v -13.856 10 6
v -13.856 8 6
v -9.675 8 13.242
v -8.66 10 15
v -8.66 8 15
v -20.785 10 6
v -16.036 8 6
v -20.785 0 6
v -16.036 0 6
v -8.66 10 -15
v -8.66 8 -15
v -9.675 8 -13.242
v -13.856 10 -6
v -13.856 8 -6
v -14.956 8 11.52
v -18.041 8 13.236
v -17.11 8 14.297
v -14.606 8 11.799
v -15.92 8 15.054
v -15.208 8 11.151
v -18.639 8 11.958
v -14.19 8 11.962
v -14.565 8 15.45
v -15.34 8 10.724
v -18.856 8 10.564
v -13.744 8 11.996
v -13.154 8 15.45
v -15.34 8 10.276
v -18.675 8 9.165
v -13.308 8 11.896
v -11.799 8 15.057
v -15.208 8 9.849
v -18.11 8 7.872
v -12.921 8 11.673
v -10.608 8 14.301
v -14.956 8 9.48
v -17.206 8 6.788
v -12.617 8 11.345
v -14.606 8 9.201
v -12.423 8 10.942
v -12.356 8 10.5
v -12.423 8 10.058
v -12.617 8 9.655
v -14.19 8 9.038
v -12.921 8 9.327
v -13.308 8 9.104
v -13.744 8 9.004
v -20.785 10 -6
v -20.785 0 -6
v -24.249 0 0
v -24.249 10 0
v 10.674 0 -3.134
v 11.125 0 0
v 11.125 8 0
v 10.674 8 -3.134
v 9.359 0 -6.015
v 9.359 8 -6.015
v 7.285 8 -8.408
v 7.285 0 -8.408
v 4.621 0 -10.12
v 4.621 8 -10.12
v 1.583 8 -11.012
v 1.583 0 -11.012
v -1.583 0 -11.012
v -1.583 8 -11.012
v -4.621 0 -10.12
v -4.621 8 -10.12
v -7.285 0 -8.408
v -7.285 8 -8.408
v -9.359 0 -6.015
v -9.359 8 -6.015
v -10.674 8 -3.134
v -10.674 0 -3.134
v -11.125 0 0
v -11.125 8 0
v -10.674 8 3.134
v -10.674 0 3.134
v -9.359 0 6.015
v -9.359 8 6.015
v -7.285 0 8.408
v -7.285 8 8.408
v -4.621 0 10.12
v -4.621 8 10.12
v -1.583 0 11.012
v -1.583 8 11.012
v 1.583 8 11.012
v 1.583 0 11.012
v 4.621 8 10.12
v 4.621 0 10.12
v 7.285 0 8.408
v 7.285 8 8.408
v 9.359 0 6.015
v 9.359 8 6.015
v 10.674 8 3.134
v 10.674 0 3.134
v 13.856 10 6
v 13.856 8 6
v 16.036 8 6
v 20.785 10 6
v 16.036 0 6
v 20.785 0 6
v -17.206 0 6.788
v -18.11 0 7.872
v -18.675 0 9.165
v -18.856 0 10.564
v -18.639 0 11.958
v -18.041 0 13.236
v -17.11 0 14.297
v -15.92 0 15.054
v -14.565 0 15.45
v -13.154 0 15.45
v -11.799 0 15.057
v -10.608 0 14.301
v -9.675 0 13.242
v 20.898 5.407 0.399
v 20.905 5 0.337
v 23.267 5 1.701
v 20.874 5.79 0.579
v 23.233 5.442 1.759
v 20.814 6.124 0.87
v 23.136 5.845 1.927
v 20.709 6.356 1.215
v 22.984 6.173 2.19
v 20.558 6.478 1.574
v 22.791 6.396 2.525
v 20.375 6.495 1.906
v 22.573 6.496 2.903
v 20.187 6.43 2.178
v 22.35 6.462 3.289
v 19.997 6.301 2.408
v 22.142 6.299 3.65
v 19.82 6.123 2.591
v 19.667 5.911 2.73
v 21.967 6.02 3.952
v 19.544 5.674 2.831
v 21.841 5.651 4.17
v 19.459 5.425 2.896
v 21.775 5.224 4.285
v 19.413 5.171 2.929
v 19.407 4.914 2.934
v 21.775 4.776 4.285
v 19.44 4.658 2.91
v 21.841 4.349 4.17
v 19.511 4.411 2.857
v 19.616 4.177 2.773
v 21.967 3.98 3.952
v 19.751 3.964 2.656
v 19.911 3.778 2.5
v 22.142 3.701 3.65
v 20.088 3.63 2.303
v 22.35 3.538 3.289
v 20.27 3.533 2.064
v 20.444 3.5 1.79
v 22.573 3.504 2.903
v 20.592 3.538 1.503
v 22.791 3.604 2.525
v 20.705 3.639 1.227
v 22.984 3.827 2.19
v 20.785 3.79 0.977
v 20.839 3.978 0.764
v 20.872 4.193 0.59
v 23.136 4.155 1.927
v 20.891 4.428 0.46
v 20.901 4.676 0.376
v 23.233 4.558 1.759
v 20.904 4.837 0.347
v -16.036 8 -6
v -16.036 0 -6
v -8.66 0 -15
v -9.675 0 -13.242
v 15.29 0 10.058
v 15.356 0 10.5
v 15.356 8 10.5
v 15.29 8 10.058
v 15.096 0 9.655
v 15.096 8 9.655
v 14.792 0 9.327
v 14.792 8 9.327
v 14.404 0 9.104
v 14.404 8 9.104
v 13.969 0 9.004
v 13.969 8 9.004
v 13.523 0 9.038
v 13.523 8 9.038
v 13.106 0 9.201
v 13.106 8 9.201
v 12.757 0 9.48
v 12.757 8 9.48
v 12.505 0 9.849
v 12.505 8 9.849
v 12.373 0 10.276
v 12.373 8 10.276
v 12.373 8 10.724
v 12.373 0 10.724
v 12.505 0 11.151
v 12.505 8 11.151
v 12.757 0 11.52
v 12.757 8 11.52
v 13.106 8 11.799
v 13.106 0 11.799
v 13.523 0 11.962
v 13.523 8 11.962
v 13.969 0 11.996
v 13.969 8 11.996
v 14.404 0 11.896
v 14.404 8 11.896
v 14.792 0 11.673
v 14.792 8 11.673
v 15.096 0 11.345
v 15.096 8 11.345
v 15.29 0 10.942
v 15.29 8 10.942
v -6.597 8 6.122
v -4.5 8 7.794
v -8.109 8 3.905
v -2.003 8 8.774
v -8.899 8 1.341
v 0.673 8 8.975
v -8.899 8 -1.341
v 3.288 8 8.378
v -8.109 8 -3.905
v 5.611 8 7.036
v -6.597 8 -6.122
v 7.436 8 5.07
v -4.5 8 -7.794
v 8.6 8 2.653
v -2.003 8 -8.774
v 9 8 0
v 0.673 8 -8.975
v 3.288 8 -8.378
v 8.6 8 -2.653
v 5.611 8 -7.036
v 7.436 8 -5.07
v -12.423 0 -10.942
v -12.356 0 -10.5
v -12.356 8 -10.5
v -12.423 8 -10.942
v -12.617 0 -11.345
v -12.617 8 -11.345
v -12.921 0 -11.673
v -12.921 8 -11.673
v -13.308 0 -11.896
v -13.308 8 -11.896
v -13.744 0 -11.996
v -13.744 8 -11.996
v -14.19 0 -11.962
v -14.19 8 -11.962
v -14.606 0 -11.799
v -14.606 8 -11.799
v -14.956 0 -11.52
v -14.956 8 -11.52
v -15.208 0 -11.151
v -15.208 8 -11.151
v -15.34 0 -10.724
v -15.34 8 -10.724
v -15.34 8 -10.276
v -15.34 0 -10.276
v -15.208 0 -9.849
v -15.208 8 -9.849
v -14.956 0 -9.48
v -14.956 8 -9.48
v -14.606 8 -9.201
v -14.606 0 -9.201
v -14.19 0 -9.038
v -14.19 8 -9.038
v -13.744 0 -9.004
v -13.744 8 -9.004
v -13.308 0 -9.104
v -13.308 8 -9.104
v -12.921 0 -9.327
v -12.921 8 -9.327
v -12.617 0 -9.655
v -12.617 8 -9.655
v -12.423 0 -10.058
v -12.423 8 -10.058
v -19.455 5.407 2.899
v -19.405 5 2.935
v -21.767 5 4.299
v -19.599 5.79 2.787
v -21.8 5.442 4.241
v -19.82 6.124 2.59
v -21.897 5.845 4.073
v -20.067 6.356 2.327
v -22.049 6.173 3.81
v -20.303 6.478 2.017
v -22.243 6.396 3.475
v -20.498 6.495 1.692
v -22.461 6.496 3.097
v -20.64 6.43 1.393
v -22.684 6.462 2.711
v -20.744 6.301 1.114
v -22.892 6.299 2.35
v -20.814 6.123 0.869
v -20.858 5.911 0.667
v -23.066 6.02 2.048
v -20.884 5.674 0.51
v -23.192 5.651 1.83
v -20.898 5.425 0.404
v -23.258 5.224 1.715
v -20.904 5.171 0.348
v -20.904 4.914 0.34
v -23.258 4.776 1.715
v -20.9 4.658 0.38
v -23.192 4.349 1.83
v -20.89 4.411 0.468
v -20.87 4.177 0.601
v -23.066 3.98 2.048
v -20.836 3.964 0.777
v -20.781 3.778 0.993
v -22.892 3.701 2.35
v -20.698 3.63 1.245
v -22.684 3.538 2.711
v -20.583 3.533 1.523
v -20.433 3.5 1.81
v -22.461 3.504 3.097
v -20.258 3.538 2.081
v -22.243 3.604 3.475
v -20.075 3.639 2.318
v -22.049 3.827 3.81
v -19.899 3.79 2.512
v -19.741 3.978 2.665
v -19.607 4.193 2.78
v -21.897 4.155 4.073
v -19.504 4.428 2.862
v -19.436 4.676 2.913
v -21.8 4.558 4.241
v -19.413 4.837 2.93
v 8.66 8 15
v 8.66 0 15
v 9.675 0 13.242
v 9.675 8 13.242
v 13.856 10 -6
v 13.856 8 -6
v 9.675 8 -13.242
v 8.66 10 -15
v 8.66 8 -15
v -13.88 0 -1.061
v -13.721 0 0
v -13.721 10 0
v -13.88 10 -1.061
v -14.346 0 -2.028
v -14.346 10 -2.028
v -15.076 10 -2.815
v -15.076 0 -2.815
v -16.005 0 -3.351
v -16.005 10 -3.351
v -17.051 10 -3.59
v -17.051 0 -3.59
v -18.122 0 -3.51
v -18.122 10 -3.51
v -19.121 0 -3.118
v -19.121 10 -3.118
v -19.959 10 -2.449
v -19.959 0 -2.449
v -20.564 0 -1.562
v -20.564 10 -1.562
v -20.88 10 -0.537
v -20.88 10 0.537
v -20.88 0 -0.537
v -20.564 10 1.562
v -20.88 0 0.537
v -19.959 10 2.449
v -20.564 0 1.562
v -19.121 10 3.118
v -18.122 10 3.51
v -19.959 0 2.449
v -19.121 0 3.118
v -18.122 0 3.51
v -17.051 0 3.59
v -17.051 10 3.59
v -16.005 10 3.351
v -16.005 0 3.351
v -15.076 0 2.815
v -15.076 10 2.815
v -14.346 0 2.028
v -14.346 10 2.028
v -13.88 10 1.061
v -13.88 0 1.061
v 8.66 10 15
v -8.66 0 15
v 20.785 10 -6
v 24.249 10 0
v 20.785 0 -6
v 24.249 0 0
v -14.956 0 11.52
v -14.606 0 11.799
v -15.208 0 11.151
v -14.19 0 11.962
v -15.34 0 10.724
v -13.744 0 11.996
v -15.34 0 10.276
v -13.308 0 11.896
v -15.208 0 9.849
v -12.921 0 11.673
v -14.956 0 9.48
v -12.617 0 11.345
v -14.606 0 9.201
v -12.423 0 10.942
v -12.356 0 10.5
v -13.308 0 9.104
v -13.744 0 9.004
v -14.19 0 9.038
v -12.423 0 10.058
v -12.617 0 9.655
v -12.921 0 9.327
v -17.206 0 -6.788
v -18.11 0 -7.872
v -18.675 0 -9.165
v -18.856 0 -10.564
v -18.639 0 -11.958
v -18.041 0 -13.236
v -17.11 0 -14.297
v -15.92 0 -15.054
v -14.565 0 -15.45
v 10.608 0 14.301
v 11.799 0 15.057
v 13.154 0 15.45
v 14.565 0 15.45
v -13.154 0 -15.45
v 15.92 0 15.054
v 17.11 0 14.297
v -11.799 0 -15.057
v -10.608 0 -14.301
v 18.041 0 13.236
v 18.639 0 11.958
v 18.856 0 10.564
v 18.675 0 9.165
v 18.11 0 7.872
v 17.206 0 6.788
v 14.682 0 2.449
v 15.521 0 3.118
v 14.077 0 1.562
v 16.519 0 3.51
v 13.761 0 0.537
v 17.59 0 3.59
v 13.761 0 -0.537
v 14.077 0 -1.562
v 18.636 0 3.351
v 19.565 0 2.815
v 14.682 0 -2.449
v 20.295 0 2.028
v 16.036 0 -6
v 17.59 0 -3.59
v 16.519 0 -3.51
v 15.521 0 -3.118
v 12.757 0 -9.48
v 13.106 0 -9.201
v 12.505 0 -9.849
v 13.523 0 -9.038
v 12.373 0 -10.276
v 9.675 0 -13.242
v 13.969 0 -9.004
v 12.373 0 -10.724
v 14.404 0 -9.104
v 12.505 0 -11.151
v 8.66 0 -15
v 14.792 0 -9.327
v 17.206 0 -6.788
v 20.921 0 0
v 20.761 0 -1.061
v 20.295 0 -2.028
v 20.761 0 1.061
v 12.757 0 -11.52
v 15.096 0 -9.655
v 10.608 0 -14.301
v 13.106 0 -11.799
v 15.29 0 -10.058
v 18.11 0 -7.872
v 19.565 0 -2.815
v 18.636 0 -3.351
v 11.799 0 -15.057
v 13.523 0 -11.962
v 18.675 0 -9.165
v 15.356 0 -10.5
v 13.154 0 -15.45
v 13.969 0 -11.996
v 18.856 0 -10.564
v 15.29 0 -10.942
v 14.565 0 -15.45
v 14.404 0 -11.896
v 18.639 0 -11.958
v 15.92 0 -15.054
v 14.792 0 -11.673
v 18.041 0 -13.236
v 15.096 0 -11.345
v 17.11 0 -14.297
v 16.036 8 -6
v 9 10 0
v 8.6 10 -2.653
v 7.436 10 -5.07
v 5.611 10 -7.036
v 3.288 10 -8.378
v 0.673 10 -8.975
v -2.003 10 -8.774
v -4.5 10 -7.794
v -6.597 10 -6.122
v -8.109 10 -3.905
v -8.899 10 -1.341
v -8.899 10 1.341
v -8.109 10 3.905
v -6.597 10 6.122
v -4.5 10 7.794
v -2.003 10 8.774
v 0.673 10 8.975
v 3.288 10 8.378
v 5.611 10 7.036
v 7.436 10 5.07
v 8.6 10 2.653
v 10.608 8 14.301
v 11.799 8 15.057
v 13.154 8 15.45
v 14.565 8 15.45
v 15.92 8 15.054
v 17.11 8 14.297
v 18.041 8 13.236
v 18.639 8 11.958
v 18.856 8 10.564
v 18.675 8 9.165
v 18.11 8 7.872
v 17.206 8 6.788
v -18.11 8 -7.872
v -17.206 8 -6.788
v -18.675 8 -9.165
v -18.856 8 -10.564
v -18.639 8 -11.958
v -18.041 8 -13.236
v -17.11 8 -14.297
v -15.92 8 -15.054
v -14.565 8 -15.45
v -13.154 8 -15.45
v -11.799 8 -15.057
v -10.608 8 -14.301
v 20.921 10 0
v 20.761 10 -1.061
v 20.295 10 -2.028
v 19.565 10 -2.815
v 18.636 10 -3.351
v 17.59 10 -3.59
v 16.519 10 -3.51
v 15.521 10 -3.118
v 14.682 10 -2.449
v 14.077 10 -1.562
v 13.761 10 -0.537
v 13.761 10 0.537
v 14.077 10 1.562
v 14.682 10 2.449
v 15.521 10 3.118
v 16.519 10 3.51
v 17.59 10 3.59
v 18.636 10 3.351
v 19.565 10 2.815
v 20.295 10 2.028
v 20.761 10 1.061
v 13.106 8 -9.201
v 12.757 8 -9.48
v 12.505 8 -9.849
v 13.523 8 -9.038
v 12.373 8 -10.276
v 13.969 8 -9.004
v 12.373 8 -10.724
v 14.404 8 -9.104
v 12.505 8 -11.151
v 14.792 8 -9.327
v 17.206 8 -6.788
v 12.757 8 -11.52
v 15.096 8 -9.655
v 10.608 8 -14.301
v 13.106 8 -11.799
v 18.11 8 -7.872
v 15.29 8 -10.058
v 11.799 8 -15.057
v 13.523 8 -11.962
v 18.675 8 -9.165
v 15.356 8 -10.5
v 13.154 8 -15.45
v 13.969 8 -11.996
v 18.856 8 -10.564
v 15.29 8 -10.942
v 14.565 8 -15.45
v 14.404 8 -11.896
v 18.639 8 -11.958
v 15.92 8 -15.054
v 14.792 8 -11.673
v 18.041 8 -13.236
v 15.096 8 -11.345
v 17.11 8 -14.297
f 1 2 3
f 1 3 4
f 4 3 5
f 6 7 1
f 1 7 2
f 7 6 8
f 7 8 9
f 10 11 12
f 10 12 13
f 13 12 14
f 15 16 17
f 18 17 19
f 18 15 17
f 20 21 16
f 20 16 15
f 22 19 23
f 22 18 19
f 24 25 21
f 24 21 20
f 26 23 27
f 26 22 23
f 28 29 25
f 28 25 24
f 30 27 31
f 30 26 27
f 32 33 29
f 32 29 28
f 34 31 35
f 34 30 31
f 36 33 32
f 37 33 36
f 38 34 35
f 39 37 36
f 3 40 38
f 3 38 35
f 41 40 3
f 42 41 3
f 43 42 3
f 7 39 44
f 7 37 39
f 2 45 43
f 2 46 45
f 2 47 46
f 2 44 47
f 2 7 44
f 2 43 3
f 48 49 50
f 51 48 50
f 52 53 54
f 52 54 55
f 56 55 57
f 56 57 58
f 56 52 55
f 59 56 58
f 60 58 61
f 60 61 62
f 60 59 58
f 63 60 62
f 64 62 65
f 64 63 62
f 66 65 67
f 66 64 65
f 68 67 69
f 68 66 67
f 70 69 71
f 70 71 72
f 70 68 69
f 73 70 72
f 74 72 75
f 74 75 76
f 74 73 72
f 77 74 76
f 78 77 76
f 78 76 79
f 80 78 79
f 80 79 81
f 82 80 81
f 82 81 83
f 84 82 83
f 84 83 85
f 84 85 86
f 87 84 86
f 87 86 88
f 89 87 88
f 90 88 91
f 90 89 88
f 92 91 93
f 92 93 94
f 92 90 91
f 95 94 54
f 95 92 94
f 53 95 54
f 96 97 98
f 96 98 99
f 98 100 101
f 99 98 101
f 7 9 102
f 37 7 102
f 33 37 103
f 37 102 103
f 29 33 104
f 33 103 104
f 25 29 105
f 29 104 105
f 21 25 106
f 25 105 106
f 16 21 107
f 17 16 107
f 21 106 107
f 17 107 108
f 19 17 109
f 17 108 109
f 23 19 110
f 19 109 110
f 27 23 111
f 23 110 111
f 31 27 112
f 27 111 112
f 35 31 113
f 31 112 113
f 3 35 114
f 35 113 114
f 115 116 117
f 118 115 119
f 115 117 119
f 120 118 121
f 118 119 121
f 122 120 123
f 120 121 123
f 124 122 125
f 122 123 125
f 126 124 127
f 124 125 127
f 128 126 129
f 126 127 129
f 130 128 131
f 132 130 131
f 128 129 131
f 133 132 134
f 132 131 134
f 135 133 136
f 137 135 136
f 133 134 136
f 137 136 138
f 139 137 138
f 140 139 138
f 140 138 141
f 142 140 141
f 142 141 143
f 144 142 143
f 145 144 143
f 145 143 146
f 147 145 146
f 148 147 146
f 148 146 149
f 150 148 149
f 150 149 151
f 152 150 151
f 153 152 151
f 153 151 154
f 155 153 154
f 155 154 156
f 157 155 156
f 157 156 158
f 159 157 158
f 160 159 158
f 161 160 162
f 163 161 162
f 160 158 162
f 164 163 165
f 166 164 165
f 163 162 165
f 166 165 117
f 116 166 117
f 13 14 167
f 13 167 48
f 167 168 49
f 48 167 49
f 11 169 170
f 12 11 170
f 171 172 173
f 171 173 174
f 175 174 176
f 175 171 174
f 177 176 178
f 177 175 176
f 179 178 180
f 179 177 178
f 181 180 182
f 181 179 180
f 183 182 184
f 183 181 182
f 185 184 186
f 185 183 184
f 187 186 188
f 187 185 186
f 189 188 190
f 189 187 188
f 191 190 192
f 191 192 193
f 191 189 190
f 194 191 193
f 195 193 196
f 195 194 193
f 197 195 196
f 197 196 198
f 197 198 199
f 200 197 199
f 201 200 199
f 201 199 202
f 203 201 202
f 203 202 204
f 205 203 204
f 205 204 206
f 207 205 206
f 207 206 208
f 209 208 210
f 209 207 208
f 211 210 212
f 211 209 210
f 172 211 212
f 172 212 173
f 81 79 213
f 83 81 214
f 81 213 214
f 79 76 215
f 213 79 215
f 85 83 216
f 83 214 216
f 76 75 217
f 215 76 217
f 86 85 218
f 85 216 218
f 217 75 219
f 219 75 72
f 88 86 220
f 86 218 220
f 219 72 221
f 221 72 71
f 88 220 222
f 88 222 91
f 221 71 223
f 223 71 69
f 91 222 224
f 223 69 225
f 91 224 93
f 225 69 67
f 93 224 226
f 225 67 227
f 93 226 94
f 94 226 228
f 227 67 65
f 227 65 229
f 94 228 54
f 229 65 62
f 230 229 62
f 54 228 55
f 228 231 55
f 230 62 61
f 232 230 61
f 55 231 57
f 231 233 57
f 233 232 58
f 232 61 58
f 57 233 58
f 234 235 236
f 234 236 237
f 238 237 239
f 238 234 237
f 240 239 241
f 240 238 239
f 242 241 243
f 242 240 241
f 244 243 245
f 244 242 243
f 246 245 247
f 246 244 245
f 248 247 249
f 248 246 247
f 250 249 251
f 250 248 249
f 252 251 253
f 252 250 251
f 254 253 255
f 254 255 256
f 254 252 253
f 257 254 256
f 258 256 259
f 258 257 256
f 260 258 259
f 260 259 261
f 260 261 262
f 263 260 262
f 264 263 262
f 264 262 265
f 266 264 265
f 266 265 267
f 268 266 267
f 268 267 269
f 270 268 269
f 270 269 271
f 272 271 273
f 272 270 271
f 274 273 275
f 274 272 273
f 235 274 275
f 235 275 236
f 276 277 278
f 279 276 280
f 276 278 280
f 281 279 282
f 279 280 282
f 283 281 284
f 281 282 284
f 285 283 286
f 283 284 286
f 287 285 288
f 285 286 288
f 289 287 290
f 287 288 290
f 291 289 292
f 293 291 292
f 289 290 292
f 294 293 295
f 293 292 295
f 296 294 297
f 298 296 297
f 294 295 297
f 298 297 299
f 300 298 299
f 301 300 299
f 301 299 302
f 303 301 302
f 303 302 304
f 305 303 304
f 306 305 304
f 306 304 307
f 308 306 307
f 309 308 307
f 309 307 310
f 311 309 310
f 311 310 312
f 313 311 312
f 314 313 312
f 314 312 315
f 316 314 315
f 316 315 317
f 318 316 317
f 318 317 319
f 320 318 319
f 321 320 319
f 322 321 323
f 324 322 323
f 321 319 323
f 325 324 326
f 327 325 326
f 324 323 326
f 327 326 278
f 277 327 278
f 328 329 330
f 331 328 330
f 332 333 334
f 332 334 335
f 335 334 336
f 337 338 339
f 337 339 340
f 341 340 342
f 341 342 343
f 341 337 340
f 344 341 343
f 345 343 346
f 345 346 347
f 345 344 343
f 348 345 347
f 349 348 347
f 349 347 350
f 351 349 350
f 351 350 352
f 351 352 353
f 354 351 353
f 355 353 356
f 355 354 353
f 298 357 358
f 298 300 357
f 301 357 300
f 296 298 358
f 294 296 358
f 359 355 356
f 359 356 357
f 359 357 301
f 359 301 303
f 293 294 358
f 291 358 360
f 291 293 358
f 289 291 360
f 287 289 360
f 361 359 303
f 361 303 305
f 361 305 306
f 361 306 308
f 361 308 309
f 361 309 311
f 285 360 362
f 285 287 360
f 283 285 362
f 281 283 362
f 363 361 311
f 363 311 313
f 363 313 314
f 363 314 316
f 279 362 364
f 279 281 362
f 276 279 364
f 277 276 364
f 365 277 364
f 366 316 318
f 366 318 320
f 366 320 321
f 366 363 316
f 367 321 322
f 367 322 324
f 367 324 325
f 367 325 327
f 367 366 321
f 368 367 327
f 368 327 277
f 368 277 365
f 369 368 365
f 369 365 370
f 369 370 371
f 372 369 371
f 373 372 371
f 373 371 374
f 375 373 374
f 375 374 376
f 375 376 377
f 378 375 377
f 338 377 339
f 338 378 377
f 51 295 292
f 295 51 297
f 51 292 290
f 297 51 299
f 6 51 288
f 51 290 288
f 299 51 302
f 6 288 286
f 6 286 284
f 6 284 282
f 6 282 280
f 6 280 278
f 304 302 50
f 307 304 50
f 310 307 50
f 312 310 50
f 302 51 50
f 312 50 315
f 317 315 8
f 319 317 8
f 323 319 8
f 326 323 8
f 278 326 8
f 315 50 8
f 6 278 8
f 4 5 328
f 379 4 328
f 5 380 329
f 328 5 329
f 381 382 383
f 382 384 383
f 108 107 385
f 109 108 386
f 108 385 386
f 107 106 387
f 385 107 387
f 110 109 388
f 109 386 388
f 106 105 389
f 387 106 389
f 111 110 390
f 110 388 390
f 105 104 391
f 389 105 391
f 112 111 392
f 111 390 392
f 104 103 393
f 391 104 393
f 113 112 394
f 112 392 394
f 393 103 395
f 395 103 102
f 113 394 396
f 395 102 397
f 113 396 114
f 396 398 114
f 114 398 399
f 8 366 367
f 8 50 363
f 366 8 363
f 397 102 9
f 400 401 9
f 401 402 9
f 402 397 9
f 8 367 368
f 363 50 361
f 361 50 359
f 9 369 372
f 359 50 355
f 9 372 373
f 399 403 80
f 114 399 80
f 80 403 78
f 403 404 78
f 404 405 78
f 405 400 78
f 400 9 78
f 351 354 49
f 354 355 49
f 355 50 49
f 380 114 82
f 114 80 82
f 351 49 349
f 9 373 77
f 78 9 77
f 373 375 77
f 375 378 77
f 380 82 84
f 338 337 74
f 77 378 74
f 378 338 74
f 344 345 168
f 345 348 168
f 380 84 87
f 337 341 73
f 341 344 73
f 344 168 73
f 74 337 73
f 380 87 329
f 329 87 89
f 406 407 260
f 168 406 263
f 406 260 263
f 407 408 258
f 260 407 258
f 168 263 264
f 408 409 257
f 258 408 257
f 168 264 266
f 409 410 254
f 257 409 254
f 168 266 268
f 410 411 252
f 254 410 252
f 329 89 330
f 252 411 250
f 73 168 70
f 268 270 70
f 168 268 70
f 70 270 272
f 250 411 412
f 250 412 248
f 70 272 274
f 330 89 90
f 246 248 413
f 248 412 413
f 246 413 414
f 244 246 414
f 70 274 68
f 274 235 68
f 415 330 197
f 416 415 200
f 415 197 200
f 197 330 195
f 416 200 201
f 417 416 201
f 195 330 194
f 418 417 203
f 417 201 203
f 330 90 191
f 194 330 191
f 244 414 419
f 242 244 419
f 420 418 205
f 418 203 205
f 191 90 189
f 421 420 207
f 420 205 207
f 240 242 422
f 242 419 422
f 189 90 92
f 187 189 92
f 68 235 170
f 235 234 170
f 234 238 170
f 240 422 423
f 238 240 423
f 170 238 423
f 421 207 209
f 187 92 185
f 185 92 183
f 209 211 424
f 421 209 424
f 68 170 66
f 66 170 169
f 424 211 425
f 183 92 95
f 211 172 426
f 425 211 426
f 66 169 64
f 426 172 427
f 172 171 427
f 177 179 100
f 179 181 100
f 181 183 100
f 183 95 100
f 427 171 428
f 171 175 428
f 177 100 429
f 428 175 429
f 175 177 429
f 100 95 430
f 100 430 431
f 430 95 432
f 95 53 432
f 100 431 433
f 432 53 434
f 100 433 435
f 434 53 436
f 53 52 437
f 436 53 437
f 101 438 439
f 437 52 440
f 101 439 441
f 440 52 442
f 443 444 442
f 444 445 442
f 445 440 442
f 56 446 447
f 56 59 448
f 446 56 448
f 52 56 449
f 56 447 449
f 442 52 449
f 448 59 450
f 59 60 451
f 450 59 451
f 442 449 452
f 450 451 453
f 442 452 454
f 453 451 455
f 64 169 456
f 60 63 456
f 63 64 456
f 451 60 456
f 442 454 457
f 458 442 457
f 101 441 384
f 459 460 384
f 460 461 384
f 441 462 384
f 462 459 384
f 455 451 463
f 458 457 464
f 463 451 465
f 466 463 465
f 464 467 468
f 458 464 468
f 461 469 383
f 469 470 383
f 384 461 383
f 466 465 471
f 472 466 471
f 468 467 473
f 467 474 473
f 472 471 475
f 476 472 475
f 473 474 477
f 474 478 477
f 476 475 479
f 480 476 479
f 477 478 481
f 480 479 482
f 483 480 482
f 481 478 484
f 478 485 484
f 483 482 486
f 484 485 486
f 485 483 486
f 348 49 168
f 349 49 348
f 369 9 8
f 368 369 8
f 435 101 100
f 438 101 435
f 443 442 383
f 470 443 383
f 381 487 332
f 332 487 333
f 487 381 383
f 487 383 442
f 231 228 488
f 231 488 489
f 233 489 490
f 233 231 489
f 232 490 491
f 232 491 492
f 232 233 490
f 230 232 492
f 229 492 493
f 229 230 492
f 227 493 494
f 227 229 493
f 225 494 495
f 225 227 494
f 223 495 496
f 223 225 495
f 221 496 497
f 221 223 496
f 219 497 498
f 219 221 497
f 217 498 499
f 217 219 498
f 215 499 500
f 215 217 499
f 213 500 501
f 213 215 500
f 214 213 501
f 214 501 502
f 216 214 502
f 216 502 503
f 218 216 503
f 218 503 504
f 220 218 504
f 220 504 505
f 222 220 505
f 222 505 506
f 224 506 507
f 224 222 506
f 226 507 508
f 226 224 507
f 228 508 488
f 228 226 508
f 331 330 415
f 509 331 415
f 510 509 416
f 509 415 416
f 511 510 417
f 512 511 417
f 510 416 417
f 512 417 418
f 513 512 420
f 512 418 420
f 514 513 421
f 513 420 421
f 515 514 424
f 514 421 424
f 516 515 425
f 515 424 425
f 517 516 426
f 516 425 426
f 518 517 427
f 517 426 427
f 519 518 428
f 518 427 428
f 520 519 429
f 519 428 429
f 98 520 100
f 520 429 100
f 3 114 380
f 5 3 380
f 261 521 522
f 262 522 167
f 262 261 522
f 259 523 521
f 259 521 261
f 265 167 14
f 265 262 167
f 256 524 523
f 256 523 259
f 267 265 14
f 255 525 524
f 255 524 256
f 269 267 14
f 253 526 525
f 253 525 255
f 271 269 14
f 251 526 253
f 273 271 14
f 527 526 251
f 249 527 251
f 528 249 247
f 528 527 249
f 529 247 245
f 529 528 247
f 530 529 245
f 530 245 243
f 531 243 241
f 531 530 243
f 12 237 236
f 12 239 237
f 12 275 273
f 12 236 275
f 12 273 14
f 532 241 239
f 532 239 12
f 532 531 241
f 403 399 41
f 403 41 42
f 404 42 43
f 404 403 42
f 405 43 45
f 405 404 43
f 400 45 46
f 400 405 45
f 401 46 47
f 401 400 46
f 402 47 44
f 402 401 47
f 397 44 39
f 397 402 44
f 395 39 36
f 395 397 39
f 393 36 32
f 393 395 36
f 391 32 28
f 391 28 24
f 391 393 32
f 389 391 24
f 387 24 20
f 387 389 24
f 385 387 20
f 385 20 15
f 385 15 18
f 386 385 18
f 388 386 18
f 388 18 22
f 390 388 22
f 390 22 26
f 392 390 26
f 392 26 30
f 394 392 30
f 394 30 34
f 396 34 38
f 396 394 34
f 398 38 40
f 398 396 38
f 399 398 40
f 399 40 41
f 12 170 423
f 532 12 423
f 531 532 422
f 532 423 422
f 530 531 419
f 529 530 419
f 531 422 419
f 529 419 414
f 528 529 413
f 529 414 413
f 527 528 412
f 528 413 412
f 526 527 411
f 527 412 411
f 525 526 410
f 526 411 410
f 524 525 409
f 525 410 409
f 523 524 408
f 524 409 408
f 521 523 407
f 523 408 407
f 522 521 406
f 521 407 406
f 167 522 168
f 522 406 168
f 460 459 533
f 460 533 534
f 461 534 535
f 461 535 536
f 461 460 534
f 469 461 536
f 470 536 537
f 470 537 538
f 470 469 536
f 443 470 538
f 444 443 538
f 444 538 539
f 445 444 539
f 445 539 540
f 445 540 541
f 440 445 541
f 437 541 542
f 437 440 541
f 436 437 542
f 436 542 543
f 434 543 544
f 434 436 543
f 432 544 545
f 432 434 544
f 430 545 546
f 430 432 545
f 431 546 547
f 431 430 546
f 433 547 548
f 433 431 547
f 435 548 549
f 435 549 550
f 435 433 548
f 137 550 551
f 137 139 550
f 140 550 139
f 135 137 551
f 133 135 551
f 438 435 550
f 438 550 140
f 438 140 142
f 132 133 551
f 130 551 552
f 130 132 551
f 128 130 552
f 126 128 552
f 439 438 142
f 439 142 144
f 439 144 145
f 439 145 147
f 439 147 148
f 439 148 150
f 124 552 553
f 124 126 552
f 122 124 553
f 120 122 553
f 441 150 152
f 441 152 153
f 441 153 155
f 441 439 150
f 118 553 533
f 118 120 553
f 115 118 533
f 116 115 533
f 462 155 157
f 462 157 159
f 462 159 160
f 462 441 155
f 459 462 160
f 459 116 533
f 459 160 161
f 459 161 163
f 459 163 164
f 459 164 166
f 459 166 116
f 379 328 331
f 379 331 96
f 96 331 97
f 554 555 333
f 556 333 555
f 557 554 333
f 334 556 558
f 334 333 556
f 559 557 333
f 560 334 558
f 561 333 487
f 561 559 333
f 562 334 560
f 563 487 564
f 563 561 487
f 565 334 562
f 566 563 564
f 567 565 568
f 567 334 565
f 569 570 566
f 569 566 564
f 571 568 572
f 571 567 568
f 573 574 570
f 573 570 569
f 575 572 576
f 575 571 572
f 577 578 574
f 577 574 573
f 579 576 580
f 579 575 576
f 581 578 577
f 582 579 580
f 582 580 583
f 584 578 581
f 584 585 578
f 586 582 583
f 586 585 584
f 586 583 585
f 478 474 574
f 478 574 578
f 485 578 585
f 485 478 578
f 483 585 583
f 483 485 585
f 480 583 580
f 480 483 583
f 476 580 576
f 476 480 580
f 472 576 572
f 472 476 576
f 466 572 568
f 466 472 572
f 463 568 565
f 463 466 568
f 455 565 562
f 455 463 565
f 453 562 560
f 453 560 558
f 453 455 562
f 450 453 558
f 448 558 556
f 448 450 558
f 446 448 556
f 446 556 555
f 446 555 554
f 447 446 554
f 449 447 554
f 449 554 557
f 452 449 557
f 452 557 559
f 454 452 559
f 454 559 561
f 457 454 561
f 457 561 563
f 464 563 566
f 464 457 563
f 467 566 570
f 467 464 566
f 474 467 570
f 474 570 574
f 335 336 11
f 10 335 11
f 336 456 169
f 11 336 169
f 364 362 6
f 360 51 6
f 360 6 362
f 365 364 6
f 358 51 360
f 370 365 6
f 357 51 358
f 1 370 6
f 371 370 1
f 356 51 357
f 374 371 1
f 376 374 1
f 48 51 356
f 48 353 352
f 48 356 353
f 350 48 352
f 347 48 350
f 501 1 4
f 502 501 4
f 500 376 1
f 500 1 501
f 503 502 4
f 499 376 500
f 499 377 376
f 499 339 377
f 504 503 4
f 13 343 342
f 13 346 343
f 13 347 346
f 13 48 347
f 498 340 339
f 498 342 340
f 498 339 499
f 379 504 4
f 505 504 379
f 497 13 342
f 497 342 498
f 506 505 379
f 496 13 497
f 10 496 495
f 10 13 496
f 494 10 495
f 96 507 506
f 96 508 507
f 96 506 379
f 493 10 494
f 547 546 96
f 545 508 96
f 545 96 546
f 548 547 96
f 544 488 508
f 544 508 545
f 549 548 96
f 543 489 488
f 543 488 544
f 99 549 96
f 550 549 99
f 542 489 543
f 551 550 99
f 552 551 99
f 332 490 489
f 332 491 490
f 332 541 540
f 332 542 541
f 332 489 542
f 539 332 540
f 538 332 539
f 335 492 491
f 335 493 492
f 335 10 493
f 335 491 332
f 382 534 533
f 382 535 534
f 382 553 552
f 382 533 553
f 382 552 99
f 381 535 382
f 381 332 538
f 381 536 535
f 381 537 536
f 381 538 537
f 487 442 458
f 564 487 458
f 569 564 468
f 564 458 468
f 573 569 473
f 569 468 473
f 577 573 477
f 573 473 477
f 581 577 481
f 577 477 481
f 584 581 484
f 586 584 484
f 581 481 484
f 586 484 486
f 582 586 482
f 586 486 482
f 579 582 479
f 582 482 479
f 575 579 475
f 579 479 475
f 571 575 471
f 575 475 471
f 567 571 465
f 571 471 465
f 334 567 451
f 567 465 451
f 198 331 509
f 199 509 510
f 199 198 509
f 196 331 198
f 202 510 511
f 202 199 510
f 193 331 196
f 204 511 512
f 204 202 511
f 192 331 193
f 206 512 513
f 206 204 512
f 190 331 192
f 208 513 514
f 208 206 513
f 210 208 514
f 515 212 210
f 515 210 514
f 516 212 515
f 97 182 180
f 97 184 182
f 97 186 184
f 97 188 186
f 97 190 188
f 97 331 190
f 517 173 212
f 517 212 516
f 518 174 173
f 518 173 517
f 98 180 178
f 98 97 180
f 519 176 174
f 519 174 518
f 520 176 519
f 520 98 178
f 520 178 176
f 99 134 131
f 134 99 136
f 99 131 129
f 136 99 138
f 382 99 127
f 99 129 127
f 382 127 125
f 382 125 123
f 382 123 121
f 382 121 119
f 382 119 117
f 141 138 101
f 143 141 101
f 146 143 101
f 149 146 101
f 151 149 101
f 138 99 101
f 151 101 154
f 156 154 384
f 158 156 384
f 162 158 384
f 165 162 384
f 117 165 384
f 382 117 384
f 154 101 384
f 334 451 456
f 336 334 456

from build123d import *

# Parameters (mm, degrees)
SKETCH1_R                      = 11.125
SKETCH1_R_2                    = 3.6
SKETCH1_R_3                    = 1.5
BOSS_EXTRUDE1_DEPTH            = 8
SKETCH2_R                      = 9
SKETCH2_R_2                    = 3.6
BOSS_EXTRUDE2_DEPTH            = 2
CUT_EXTRUDE1_REACH             = 51.75
SKETCH4_R                      = 1.5
CUT_EXTRUDE1_DIRECTION_2_DEPTH = 8.75
CUT_EXTRUDE2_REACH             = 51.75
SKETCH5_R                      = 1.5


with BuildPart() as part:
    # Sketch1 → Boss-Extrude1 (new body)
    with BuildSketch(Plane(origin=(0, 0, 0), x_dir=(1, 0, 0), z_dir=(0, 1, 0))):
        with BuildLine():
            Line((8.660254038, 15), (-8.660254038, 15))
            Line((-8.660254038, 15), (-9.675277915, 13.241927075))
            ThreePointArc((-9.675277915, 13.241927075), (-17.613141308, 13.799536829), (-16.035855932, 6))
            Line((-16.035855932, 6), (-20.784609691, 6))
            Line((-20.784609691, 6), (-24.248711306, 0))
            Line((-24.248711306, 0), (-20.784609691, -6))
            Line((-20.784609691, -6), (-16.035855932, -6))
            ThreePointArc((-16.035855932, -6), (-17.613141308, -13.799536829), (-9.675277915, -13.241927075))
            Line((-9.675277915, -13.241927075), (-8.660254038, -15))
            Line((-8.660254038, -15), (8.660254038, -15))
            Line((8.660254038, -15), (9.675277915, -13.241927075))
            ThreePointArc((9.675277915, -13.241927075), (17.613141308, -13.799536829), (16.035855932, -6))
            Line((16.035855932, -6), (20.784609691, -6))
            Line((20.784609691, -6), (24.248711306, 0))
            Line((24.248711306, 0), (20.784609691, 6))
            Line((20.784609691, 6), (16.035855932, 6))
            ThreePointArc((16.035855932, 6), (17.613141308, 13.799536829), (9.675277915, 13.241927075))
            Line((9.675277915, 13.241927075), (8.660254038, 15))
        make_face()
        Circle(SKETCH1_R, mode=Mode.SUBTRACT)
        with Locations((17.320508076, 0)):
            Circle(SKETCH1_R_2, mode=Mode.SUBTRACT)
        with Locations((-17.320508076, 0)):
            Circle(SKETCH1_R_2, mode=Mode.SUBTRACT)
        with Locations((-13.856406461, 10.5)):
            Circle(SKETCH1_R_3, mode=Mode.SUBTRACT)
        with Locations((13.856406461, 10.5)):
            Circle(SKETCH1_R_3, mode=Mode.SUBTRACT)
        with Locations((13.856406461, -10.5)):
            Circle(SKETCH1_R_3, mode=Mode.SUBTRACT)
        with Locations((-13.856406461, -10.5)):
            Circle(SKETCH1_R_3, mode=Mode.SUBTRACT)
    extrude(amount=BOSS_EXTRUDE1_DEPTH)

    # Sketch2 → Boss-Extrude2 (add)
    with BuildSketch(Plane(origin=(0, 8, 0), x_dir=(1, 0, 0), z_dir=(0, 1, 0))):
        Polygon((8.660254038, -15), (13.856406461, -6), (20.784609691, -6), (24.248711306, 0), (20.784609691, 6), (13.856406461, 6), (8.660254038, 15), (-8.660254038, 15), (-13.856406461, 6), (-20.784609691, 6), (-24.248711306, 0), (-20.784609691, -6), (-13.856406461, -6), (-8.660254038, -15), align=None)
        Circle(SKETCH2_R, mode=Mode.SUBTRACT)
        with Locations((-17.320508076, 0)):
            Circle(SKETCH2_R_2, mode=Mode.SUBTRACT)
        with Locations((17.320508076, 0)):
            Circle(SKETCH2_R_2, mode=Mode.SUBTRACT)
    extrude(amount=BOSS_EXTRUDE2_DEPTH)

    # Sketch4 → Cut-Extrude1 (cut, up to next)
    with BuildSketch(Plane(origin=(-18.186533479, 0, 10.5), x_dir=(0.5, 0, 0.866025404), z_dir=(-0.866025404, 0, 0.5)), mode=Mode.PRIVATE) as cut_extrude1_sk1:
        with Locations((-8.660254038, 5)):
            Circle(SKETCH4_R)
    cut_extrude1_tool1 = extrude(cut_extrude1_sk1.sketch, amount=-CUT_EXTRUDE1_REACH, mode=Mode.PRIVATE) & part.part
    add(cut_extrude1_tool1.solids().sort_by_distance((-22.51666, 5, 3))[0], mode=Mode.SUBTRACT)

    # Sketch4 → Cut-Extrude1 direction 2 (cut)
    with BuildSketch(Plane(origin=(-18.186533479, 0, 10.5), x_dir=(0.5, 0, 0.866025404), z_dir=(-0.866025404, 0, 0.5))):
        with Locations((-8.660254038, 5)):
            Circle(SKETCH4_R)
    extrude(amount=CUT_EXTRUDE1_DIRECTION_2_DEPTH, mode=Mode.SUBTRACT)

    # Sketch5 → Cut-Extrude2 (cut, up to next)
    with BuildSketch(Plane(origin=(18.186533479, 0, 10.5), x_dir=(0.5, 0, -0.866025404), z_dir=(0.866025404, 0, 0.5)), mode=Mode.PRIVATE) as cut_extrude2_sk1:
        with Locations((8.660254038, 5)):
            Circle(SKETCH5_R)
    cut_extrude2_tool1 = extrude(cut_extrude2_sk1.sketch, amount=-CUT_EXTRUDE2_REACH, mode=Mode.PRIVATE) & part.part
    add(cut_extrude2_tool1.solids().sort_by_distance((22.51666, 5, 3))[0], mode=Mode.SUBTRACT)


solid = part.part
